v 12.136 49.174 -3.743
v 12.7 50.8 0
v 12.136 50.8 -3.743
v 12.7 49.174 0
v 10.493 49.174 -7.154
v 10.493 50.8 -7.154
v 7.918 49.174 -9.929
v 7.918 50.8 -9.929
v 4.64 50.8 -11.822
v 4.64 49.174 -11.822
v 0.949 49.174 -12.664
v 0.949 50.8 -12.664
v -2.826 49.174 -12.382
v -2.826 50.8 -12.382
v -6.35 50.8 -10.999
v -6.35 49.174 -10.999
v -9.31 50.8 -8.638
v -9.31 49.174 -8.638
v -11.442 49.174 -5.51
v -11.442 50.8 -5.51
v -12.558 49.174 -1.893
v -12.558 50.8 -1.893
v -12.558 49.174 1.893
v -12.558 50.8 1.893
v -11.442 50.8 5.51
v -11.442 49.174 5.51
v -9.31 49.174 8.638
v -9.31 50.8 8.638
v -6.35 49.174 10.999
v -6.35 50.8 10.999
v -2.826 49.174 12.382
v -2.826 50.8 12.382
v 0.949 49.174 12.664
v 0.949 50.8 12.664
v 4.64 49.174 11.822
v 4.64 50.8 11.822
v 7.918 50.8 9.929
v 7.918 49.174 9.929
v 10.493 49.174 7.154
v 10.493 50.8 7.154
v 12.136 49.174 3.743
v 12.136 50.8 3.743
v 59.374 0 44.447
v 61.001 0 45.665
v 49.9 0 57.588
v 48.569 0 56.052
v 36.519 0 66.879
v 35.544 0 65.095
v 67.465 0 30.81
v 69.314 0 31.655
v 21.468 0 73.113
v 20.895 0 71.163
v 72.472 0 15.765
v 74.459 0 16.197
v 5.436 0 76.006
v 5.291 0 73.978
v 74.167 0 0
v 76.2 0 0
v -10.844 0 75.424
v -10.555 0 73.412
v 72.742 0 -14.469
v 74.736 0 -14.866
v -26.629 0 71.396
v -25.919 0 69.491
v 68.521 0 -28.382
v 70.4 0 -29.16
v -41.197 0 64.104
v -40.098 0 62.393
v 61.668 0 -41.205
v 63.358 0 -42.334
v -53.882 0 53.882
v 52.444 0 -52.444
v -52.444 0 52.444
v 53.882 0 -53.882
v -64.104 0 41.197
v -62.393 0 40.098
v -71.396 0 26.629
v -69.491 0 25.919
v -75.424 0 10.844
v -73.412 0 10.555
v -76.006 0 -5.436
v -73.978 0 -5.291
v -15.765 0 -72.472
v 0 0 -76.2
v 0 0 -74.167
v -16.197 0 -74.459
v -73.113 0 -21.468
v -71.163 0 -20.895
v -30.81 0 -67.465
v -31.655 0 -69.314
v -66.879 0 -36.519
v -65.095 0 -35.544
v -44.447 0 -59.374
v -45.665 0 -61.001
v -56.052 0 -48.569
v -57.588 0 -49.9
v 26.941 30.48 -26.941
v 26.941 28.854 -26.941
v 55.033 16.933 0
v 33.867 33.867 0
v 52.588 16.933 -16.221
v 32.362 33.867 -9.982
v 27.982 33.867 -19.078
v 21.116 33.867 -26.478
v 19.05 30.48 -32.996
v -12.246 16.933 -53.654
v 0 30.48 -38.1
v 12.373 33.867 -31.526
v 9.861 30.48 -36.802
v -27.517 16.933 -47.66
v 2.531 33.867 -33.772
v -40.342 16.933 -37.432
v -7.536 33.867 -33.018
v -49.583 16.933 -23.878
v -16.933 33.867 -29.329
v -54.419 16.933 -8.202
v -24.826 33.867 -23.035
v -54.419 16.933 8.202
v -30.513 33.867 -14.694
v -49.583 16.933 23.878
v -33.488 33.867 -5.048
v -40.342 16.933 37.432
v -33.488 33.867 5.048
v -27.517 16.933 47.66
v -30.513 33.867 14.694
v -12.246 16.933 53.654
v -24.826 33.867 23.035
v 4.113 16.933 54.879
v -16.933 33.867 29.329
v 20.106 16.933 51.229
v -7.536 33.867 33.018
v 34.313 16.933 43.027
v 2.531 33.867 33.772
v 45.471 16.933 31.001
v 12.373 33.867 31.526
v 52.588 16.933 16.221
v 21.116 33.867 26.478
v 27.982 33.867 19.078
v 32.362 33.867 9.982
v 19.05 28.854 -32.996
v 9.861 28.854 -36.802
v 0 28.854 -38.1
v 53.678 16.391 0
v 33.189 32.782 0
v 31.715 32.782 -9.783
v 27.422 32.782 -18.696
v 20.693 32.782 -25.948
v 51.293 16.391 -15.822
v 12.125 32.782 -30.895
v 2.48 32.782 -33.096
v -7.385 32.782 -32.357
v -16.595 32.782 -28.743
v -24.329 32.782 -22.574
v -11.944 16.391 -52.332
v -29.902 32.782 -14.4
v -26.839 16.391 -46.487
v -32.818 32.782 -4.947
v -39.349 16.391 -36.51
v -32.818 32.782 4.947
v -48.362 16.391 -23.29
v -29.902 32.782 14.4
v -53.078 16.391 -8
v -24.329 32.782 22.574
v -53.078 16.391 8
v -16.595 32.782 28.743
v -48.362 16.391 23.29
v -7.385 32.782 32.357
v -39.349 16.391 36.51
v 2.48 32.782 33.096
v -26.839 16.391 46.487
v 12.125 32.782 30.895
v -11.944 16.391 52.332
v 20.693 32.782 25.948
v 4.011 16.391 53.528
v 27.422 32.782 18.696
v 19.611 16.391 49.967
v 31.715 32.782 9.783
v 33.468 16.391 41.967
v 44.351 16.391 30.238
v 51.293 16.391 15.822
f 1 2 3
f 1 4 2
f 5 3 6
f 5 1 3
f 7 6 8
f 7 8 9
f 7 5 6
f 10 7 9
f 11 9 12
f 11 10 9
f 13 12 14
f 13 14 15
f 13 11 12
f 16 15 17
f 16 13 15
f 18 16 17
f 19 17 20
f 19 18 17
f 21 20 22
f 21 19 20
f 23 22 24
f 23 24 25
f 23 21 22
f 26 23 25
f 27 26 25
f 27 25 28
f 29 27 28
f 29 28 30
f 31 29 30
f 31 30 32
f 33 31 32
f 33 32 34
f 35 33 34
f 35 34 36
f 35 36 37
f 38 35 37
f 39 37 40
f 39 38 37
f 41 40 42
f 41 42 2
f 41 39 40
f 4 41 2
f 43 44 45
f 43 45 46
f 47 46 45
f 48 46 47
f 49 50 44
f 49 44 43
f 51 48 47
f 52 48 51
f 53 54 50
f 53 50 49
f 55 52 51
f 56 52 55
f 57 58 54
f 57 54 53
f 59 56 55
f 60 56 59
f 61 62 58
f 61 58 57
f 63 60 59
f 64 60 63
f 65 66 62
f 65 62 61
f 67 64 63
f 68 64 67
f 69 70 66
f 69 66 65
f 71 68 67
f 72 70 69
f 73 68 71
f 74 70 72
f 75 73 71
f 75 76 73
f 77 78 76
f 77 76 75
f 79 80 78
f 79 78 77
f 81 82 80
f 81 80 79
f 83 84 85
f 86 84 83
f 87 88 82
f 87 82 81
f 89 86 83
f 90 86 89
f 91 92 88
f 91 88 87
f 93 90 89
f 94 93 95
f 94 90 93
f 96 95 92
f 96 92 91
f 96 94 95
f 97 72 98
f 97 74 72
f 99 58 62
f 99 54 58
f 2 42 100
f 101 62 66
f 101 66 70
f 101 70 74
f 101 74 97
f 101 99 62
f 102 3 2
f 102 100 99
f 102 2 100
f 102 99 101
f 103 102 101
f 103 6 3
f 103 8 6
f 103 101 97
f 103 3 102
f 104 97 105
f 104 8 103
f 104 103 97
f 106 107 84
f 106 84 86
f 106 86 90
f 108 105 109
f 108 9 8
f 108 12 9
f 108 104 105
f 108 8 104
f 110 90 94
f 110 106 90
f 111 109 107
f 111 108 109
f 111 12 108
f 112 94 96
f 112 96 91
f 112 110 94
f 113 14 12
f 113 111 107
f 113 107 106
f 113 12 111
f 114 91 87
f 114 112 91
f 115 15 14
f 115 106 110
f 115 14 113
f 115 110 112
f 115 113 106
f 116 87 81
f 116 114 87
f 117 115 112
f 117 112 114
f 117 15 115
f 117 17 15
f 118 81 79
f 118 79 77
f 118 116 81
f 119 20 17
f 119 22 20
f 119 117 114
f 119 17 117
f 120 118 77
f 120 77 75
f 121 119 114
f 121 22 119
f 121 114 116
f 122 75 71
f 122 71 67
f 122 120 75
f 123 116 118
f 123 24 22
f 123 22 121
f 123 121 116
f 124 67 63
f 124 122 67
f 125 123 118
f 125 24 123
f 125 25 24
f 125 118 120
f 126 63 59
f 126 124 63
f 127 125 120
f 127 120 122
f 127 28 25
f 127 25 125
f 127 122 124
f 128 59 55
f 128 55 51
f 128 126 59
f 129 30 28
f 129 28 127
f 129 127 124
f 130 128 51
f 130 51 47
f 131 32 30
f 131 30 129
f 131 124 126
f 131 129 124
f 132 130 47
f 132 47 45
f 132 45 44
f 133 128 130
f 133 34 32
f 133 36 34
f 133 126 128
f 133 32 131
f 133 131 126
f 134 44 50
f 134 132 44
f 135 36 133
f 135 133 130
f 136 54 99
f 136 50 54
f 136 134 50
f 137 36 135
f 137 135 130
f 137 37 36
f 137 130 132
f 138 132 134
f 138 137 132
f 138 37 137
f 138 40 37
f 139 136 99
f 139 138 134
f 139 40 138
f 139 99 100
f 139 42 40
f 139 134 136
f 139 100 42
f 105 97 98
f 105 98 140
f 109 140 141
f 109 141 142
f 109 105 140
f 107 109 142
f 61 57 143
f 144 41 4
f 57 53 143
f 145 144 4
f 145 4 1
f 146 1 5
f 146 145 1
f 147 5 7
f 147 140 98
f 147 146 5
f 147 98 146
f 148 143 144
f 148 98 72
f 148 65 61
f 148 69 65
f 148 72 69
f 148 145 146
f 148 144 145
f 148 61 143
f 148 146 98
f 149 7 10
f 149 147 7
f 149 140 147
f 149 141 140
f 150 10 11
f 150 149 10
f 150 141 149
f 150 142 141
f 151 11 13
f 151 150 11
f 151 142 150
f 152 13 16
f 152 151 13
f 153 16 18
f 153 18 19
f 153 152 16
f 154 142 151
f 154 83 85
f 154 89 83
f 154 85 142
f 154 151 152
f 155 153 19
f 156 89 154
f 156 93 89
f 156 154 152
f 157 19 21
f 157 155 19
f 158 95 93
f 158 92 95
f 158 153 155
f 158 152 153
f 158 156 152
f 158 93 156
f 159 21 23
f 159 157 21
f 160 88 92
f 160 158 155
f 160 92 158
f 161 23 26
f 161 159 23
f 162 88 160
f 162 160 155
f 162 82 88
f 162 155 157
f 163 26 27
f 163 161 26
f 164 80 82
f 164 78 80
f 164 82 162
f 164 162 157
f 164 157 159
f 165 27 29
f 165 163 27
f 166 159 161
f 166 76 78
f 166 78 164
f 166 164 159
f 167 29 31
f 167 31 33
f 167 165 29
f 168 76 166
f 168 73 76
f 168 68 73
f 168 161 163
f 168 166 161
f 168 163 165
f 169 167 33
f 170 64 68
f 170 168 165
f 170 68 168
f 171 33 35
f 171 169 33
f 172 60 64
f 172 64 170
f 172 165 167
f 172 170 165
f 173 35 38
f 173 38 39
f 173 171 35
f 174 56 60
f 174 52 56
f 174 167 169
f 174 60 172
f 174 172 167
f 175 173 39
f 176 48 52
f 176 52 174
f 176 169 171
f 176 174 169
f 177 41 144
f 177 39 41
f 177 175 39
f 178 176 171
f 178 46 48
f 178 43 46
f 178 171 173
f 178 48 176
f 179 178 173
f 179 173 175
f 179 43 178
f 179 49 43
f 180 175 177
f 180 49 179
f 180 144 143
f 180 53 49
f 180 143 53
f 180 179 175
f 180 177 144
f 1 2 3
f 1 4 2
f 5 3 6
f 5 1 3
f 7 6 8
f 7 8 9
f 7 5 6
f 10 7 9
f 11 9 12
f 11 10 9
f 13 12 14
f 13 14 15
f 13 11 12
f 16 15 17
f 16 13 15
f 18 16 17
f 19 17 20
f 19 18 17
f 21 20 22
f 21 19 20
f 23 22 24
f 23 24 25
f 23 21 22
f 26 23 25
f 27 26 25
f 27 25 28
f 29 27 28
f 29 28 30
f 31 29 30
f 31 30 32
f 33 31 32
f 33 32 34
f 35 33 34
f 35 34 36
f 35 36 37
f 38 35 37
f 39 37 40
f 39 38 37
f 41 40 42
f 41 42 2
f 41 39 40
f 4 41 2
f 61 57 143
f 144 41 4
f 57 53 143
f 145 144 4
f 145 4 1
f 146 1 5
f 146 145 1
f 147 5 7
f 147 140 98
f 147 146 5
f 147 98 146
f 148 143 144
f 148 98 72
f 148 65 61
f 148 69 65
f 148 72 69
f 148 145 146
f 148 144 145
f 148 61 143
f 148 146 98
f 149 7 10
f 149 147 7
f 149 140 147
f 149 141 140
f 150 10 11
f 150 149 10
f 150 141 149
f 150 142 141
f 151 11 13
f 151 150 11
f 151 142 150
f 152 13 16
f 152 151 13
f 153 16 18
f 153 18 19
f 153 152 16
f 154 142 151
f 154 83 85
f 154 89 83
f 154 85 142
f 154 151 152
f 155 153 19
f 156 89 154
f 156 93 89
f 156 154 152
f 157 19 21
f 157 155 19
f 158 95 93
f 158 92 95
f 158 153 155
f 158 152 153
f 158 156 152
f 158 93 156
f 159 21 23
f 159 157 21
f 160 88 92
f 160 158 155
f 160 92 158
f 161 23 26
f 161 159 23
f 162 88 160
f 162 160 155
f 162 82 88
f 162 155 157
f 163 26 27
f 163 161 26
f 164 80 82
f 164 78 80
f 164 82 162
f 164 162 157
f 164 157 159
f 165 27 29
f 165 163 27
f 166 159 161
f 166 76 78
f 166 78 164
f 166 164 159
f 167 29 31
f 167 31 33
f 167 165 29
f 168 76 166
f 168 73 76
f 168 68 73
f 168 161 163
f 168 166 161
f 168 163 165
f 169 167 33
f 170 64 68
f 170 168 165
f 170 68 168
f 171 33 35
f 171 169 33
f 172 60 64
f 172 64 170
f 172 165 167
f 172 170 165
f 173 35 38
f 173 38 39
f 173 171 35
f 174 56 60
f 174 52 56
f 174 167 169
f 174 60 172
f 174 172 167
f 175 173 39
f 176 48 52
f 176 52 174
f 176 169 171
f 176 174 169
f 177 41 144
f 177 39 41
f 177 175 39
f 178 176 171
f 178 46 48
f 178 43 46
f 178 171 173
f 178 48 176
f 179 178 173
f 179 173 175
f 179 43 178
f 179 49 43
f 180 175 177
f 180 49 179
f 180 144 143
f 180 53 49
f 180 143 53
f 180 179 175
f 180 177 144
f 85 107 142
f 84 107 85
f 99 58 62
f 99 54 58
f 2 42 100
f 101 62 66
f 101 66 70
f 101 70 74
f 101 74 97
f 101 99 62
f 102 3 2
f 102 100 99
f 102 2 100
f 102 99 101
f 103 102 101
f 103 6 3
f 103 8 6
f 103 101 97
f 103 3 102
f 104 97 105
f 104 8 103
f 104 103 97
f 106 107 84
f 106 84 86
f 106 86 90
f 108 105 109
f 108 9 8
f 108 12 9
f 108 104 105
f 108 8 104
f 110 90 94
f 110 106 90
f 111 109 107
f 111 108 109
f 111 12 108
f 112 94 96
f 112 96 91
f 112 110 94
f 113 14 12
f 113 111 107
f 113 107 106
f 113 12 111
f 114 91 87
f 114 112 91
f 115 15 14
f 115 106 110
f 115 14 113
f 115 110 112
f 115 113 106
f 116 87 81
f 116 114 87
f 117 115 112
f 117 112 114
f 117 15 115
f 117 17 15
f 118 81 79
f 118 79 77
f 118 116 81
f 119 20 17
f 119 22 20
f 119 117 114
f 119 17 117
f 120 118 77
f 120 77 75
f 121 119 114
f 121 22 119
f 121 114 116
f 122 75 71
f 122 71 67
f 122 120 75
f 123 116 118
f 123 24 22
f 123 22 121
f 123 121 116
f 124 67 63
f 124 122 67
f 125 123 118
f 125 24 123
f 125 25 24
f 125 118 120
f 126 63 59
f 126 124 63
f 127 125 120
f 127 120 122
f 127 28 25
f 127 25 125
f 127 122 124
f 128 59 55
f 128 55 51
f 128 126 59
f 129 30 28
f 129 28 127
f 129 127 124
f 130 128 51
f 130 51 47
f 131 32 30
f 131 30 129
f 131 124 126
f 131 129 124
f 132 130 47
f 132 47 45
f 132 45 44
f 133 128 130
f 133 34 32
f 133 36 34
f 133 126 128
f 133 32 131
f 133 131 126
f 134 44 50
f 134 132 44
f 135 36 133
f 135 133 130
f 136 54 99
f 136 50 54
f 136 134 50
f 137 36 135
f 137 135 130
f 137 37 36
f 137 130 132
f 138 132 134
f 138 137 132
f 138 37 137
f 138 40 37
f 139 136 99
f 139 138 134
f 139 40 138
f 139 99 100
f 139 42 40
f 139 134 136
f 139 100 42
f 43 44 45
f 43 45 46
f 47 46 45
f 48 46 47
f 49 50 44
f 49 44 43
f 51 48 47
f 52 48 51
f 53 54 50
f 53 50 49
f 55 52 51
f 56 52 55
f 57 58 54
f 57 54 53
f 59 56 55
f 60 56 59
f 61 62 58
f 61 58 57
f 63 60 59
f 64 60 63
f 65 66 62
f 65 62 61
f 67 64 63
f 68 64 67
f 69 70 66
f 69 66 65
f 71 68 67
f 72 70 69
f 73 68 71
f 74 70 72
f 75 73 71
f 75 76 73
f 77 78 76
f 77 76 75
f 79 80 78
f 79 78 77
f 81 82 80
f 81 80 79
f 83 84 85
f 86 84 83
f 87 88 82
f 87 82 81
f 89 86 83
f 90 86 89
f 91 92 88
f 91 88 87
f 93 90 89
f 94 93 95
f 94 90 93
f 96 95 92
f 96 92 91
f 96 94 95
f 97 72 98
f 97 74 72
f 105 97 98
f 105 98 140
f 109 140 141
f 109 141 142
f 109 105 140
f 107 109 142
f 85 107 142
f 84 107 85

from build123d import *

# Parameters (mm, degrees)
CUT_EXTRUDE1_DEPTH = 76.2


# Read off the part's stored shape, not the designer's step: Revolve2
with BuildPart() as part:
    # Revolve2 outline → Revolve2 (revolve)
    with BuildSketch(Plane.XY):
        Polygon((12.7, 49.173606444), (74.167008055, 0), (76.2, 0), (12.7, 50.8), align=None)
    revolve(axis=Axis((0, 0, 0), (0, 1, 0)))


with BuildPart() as body_2:
    # Revolve2 2 outline → Revolve2 2 (revolve)
    with BuildSketch(Plane.XY):
        Polygon((12.7, 50.8), (12.7, 49.173606444), (74.167008055, 0), (76.2, 0), align=None)
    revolve(axis=Axis((0, 0, 0), (0, 1, 0)))


with BuildPart() as cut_extrude1_tool:
    # Sketch2 → Cut-Extrude1 (new, symmetric)
    with BuildSketch(Plane(origin=(0, 0, 0), x_dir=(1, 0, 0), z_dir=(0, 1, 0))):
        with BuildLine():
            Line((0, 38.1), (0, 76.2))
            ThreePointArc((0, 76.2), (29.160477546, 70.399620377), (53.881536726, 53.881536726))
            Line((53.881536726, 53.881536726), (26.940768363, 26.940768363))
            ThreePointArc((26.940768363, 26.940768363), (14.580238773, 35.199810189), (0, 38.1))
        make_face()
    extrude(amount=CUT_EXTRUDE1_DEPTH, both=True)


with BuildPart() as part_1:
    add(part.part)

    # Cut-Extrude1: cut by cut_extrude1_tool
    add(cut_extrude1_tool.part, mode=Mode.SUBTRACT)


with BuildPart() as body_2_1:
    add(body_2.part)

    # Cut-Extrude1: cut by cut_extrude1_tool
    add(cut_extrude1_tool.part, mode=Mode.SUBTRACT)


solid = Compound([part_1.part, body_2_1.part])
